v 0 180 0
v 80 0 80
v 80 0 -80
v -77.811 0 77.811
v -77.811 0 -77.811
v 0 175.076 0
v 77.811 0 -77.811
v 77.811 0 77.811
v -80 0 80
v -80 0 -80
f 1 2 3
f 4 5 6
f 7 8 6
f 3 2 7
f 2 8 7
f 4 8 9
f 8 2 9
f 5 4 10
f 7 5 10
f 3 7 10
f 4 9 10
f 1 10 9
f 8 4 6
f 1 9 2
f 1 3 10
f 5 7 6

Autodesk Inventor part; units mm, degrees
ref_plane "YZ Plane" through (0, 0, 0) normal (1, 0, 0) x (0, 1, 0)
ref_plane "XY Plane" through (0, 0, 0) normal (0, 0, 1) x (1, 0, 0)
sketch "Sketch1" plane through (0, 0, 0) normal (0, 1, 0) x (-1, 0, 0)
  line L0 (-80, 80) -> (80, 80)
  line L1 (80, 80) -> (80, -80)
  line L2 (80, -80) -> (-80, -80)
  line L3 (-80, -80) -> (-80, 80)
  line L4 (-80, 80) -> (80, -80) construction
  line L5 (80, 80) -> (-80, -80) construction
  point P0 (0, 0)
  dimension "d0" = 160
  dimension "d1" = 160
ref_plane "Work Plane3" through (0, 180, 0) normal (0, 1, 0) x (-1, 0, 0)
sketch "Sketch7" plane through (0, 180, 0) normal (0, 1, 0) x (-1, 0, 0)
  point P0 (0, 0)
  point P1 (0, 0)
loft "Loft2" add profiles "Sketch1" section 2 point at (0, 180, 0)
shell "Shell2" thickness 2 removed faces 1 at (26.6667, 0, 26.6667)
properties part number "pyramid"
